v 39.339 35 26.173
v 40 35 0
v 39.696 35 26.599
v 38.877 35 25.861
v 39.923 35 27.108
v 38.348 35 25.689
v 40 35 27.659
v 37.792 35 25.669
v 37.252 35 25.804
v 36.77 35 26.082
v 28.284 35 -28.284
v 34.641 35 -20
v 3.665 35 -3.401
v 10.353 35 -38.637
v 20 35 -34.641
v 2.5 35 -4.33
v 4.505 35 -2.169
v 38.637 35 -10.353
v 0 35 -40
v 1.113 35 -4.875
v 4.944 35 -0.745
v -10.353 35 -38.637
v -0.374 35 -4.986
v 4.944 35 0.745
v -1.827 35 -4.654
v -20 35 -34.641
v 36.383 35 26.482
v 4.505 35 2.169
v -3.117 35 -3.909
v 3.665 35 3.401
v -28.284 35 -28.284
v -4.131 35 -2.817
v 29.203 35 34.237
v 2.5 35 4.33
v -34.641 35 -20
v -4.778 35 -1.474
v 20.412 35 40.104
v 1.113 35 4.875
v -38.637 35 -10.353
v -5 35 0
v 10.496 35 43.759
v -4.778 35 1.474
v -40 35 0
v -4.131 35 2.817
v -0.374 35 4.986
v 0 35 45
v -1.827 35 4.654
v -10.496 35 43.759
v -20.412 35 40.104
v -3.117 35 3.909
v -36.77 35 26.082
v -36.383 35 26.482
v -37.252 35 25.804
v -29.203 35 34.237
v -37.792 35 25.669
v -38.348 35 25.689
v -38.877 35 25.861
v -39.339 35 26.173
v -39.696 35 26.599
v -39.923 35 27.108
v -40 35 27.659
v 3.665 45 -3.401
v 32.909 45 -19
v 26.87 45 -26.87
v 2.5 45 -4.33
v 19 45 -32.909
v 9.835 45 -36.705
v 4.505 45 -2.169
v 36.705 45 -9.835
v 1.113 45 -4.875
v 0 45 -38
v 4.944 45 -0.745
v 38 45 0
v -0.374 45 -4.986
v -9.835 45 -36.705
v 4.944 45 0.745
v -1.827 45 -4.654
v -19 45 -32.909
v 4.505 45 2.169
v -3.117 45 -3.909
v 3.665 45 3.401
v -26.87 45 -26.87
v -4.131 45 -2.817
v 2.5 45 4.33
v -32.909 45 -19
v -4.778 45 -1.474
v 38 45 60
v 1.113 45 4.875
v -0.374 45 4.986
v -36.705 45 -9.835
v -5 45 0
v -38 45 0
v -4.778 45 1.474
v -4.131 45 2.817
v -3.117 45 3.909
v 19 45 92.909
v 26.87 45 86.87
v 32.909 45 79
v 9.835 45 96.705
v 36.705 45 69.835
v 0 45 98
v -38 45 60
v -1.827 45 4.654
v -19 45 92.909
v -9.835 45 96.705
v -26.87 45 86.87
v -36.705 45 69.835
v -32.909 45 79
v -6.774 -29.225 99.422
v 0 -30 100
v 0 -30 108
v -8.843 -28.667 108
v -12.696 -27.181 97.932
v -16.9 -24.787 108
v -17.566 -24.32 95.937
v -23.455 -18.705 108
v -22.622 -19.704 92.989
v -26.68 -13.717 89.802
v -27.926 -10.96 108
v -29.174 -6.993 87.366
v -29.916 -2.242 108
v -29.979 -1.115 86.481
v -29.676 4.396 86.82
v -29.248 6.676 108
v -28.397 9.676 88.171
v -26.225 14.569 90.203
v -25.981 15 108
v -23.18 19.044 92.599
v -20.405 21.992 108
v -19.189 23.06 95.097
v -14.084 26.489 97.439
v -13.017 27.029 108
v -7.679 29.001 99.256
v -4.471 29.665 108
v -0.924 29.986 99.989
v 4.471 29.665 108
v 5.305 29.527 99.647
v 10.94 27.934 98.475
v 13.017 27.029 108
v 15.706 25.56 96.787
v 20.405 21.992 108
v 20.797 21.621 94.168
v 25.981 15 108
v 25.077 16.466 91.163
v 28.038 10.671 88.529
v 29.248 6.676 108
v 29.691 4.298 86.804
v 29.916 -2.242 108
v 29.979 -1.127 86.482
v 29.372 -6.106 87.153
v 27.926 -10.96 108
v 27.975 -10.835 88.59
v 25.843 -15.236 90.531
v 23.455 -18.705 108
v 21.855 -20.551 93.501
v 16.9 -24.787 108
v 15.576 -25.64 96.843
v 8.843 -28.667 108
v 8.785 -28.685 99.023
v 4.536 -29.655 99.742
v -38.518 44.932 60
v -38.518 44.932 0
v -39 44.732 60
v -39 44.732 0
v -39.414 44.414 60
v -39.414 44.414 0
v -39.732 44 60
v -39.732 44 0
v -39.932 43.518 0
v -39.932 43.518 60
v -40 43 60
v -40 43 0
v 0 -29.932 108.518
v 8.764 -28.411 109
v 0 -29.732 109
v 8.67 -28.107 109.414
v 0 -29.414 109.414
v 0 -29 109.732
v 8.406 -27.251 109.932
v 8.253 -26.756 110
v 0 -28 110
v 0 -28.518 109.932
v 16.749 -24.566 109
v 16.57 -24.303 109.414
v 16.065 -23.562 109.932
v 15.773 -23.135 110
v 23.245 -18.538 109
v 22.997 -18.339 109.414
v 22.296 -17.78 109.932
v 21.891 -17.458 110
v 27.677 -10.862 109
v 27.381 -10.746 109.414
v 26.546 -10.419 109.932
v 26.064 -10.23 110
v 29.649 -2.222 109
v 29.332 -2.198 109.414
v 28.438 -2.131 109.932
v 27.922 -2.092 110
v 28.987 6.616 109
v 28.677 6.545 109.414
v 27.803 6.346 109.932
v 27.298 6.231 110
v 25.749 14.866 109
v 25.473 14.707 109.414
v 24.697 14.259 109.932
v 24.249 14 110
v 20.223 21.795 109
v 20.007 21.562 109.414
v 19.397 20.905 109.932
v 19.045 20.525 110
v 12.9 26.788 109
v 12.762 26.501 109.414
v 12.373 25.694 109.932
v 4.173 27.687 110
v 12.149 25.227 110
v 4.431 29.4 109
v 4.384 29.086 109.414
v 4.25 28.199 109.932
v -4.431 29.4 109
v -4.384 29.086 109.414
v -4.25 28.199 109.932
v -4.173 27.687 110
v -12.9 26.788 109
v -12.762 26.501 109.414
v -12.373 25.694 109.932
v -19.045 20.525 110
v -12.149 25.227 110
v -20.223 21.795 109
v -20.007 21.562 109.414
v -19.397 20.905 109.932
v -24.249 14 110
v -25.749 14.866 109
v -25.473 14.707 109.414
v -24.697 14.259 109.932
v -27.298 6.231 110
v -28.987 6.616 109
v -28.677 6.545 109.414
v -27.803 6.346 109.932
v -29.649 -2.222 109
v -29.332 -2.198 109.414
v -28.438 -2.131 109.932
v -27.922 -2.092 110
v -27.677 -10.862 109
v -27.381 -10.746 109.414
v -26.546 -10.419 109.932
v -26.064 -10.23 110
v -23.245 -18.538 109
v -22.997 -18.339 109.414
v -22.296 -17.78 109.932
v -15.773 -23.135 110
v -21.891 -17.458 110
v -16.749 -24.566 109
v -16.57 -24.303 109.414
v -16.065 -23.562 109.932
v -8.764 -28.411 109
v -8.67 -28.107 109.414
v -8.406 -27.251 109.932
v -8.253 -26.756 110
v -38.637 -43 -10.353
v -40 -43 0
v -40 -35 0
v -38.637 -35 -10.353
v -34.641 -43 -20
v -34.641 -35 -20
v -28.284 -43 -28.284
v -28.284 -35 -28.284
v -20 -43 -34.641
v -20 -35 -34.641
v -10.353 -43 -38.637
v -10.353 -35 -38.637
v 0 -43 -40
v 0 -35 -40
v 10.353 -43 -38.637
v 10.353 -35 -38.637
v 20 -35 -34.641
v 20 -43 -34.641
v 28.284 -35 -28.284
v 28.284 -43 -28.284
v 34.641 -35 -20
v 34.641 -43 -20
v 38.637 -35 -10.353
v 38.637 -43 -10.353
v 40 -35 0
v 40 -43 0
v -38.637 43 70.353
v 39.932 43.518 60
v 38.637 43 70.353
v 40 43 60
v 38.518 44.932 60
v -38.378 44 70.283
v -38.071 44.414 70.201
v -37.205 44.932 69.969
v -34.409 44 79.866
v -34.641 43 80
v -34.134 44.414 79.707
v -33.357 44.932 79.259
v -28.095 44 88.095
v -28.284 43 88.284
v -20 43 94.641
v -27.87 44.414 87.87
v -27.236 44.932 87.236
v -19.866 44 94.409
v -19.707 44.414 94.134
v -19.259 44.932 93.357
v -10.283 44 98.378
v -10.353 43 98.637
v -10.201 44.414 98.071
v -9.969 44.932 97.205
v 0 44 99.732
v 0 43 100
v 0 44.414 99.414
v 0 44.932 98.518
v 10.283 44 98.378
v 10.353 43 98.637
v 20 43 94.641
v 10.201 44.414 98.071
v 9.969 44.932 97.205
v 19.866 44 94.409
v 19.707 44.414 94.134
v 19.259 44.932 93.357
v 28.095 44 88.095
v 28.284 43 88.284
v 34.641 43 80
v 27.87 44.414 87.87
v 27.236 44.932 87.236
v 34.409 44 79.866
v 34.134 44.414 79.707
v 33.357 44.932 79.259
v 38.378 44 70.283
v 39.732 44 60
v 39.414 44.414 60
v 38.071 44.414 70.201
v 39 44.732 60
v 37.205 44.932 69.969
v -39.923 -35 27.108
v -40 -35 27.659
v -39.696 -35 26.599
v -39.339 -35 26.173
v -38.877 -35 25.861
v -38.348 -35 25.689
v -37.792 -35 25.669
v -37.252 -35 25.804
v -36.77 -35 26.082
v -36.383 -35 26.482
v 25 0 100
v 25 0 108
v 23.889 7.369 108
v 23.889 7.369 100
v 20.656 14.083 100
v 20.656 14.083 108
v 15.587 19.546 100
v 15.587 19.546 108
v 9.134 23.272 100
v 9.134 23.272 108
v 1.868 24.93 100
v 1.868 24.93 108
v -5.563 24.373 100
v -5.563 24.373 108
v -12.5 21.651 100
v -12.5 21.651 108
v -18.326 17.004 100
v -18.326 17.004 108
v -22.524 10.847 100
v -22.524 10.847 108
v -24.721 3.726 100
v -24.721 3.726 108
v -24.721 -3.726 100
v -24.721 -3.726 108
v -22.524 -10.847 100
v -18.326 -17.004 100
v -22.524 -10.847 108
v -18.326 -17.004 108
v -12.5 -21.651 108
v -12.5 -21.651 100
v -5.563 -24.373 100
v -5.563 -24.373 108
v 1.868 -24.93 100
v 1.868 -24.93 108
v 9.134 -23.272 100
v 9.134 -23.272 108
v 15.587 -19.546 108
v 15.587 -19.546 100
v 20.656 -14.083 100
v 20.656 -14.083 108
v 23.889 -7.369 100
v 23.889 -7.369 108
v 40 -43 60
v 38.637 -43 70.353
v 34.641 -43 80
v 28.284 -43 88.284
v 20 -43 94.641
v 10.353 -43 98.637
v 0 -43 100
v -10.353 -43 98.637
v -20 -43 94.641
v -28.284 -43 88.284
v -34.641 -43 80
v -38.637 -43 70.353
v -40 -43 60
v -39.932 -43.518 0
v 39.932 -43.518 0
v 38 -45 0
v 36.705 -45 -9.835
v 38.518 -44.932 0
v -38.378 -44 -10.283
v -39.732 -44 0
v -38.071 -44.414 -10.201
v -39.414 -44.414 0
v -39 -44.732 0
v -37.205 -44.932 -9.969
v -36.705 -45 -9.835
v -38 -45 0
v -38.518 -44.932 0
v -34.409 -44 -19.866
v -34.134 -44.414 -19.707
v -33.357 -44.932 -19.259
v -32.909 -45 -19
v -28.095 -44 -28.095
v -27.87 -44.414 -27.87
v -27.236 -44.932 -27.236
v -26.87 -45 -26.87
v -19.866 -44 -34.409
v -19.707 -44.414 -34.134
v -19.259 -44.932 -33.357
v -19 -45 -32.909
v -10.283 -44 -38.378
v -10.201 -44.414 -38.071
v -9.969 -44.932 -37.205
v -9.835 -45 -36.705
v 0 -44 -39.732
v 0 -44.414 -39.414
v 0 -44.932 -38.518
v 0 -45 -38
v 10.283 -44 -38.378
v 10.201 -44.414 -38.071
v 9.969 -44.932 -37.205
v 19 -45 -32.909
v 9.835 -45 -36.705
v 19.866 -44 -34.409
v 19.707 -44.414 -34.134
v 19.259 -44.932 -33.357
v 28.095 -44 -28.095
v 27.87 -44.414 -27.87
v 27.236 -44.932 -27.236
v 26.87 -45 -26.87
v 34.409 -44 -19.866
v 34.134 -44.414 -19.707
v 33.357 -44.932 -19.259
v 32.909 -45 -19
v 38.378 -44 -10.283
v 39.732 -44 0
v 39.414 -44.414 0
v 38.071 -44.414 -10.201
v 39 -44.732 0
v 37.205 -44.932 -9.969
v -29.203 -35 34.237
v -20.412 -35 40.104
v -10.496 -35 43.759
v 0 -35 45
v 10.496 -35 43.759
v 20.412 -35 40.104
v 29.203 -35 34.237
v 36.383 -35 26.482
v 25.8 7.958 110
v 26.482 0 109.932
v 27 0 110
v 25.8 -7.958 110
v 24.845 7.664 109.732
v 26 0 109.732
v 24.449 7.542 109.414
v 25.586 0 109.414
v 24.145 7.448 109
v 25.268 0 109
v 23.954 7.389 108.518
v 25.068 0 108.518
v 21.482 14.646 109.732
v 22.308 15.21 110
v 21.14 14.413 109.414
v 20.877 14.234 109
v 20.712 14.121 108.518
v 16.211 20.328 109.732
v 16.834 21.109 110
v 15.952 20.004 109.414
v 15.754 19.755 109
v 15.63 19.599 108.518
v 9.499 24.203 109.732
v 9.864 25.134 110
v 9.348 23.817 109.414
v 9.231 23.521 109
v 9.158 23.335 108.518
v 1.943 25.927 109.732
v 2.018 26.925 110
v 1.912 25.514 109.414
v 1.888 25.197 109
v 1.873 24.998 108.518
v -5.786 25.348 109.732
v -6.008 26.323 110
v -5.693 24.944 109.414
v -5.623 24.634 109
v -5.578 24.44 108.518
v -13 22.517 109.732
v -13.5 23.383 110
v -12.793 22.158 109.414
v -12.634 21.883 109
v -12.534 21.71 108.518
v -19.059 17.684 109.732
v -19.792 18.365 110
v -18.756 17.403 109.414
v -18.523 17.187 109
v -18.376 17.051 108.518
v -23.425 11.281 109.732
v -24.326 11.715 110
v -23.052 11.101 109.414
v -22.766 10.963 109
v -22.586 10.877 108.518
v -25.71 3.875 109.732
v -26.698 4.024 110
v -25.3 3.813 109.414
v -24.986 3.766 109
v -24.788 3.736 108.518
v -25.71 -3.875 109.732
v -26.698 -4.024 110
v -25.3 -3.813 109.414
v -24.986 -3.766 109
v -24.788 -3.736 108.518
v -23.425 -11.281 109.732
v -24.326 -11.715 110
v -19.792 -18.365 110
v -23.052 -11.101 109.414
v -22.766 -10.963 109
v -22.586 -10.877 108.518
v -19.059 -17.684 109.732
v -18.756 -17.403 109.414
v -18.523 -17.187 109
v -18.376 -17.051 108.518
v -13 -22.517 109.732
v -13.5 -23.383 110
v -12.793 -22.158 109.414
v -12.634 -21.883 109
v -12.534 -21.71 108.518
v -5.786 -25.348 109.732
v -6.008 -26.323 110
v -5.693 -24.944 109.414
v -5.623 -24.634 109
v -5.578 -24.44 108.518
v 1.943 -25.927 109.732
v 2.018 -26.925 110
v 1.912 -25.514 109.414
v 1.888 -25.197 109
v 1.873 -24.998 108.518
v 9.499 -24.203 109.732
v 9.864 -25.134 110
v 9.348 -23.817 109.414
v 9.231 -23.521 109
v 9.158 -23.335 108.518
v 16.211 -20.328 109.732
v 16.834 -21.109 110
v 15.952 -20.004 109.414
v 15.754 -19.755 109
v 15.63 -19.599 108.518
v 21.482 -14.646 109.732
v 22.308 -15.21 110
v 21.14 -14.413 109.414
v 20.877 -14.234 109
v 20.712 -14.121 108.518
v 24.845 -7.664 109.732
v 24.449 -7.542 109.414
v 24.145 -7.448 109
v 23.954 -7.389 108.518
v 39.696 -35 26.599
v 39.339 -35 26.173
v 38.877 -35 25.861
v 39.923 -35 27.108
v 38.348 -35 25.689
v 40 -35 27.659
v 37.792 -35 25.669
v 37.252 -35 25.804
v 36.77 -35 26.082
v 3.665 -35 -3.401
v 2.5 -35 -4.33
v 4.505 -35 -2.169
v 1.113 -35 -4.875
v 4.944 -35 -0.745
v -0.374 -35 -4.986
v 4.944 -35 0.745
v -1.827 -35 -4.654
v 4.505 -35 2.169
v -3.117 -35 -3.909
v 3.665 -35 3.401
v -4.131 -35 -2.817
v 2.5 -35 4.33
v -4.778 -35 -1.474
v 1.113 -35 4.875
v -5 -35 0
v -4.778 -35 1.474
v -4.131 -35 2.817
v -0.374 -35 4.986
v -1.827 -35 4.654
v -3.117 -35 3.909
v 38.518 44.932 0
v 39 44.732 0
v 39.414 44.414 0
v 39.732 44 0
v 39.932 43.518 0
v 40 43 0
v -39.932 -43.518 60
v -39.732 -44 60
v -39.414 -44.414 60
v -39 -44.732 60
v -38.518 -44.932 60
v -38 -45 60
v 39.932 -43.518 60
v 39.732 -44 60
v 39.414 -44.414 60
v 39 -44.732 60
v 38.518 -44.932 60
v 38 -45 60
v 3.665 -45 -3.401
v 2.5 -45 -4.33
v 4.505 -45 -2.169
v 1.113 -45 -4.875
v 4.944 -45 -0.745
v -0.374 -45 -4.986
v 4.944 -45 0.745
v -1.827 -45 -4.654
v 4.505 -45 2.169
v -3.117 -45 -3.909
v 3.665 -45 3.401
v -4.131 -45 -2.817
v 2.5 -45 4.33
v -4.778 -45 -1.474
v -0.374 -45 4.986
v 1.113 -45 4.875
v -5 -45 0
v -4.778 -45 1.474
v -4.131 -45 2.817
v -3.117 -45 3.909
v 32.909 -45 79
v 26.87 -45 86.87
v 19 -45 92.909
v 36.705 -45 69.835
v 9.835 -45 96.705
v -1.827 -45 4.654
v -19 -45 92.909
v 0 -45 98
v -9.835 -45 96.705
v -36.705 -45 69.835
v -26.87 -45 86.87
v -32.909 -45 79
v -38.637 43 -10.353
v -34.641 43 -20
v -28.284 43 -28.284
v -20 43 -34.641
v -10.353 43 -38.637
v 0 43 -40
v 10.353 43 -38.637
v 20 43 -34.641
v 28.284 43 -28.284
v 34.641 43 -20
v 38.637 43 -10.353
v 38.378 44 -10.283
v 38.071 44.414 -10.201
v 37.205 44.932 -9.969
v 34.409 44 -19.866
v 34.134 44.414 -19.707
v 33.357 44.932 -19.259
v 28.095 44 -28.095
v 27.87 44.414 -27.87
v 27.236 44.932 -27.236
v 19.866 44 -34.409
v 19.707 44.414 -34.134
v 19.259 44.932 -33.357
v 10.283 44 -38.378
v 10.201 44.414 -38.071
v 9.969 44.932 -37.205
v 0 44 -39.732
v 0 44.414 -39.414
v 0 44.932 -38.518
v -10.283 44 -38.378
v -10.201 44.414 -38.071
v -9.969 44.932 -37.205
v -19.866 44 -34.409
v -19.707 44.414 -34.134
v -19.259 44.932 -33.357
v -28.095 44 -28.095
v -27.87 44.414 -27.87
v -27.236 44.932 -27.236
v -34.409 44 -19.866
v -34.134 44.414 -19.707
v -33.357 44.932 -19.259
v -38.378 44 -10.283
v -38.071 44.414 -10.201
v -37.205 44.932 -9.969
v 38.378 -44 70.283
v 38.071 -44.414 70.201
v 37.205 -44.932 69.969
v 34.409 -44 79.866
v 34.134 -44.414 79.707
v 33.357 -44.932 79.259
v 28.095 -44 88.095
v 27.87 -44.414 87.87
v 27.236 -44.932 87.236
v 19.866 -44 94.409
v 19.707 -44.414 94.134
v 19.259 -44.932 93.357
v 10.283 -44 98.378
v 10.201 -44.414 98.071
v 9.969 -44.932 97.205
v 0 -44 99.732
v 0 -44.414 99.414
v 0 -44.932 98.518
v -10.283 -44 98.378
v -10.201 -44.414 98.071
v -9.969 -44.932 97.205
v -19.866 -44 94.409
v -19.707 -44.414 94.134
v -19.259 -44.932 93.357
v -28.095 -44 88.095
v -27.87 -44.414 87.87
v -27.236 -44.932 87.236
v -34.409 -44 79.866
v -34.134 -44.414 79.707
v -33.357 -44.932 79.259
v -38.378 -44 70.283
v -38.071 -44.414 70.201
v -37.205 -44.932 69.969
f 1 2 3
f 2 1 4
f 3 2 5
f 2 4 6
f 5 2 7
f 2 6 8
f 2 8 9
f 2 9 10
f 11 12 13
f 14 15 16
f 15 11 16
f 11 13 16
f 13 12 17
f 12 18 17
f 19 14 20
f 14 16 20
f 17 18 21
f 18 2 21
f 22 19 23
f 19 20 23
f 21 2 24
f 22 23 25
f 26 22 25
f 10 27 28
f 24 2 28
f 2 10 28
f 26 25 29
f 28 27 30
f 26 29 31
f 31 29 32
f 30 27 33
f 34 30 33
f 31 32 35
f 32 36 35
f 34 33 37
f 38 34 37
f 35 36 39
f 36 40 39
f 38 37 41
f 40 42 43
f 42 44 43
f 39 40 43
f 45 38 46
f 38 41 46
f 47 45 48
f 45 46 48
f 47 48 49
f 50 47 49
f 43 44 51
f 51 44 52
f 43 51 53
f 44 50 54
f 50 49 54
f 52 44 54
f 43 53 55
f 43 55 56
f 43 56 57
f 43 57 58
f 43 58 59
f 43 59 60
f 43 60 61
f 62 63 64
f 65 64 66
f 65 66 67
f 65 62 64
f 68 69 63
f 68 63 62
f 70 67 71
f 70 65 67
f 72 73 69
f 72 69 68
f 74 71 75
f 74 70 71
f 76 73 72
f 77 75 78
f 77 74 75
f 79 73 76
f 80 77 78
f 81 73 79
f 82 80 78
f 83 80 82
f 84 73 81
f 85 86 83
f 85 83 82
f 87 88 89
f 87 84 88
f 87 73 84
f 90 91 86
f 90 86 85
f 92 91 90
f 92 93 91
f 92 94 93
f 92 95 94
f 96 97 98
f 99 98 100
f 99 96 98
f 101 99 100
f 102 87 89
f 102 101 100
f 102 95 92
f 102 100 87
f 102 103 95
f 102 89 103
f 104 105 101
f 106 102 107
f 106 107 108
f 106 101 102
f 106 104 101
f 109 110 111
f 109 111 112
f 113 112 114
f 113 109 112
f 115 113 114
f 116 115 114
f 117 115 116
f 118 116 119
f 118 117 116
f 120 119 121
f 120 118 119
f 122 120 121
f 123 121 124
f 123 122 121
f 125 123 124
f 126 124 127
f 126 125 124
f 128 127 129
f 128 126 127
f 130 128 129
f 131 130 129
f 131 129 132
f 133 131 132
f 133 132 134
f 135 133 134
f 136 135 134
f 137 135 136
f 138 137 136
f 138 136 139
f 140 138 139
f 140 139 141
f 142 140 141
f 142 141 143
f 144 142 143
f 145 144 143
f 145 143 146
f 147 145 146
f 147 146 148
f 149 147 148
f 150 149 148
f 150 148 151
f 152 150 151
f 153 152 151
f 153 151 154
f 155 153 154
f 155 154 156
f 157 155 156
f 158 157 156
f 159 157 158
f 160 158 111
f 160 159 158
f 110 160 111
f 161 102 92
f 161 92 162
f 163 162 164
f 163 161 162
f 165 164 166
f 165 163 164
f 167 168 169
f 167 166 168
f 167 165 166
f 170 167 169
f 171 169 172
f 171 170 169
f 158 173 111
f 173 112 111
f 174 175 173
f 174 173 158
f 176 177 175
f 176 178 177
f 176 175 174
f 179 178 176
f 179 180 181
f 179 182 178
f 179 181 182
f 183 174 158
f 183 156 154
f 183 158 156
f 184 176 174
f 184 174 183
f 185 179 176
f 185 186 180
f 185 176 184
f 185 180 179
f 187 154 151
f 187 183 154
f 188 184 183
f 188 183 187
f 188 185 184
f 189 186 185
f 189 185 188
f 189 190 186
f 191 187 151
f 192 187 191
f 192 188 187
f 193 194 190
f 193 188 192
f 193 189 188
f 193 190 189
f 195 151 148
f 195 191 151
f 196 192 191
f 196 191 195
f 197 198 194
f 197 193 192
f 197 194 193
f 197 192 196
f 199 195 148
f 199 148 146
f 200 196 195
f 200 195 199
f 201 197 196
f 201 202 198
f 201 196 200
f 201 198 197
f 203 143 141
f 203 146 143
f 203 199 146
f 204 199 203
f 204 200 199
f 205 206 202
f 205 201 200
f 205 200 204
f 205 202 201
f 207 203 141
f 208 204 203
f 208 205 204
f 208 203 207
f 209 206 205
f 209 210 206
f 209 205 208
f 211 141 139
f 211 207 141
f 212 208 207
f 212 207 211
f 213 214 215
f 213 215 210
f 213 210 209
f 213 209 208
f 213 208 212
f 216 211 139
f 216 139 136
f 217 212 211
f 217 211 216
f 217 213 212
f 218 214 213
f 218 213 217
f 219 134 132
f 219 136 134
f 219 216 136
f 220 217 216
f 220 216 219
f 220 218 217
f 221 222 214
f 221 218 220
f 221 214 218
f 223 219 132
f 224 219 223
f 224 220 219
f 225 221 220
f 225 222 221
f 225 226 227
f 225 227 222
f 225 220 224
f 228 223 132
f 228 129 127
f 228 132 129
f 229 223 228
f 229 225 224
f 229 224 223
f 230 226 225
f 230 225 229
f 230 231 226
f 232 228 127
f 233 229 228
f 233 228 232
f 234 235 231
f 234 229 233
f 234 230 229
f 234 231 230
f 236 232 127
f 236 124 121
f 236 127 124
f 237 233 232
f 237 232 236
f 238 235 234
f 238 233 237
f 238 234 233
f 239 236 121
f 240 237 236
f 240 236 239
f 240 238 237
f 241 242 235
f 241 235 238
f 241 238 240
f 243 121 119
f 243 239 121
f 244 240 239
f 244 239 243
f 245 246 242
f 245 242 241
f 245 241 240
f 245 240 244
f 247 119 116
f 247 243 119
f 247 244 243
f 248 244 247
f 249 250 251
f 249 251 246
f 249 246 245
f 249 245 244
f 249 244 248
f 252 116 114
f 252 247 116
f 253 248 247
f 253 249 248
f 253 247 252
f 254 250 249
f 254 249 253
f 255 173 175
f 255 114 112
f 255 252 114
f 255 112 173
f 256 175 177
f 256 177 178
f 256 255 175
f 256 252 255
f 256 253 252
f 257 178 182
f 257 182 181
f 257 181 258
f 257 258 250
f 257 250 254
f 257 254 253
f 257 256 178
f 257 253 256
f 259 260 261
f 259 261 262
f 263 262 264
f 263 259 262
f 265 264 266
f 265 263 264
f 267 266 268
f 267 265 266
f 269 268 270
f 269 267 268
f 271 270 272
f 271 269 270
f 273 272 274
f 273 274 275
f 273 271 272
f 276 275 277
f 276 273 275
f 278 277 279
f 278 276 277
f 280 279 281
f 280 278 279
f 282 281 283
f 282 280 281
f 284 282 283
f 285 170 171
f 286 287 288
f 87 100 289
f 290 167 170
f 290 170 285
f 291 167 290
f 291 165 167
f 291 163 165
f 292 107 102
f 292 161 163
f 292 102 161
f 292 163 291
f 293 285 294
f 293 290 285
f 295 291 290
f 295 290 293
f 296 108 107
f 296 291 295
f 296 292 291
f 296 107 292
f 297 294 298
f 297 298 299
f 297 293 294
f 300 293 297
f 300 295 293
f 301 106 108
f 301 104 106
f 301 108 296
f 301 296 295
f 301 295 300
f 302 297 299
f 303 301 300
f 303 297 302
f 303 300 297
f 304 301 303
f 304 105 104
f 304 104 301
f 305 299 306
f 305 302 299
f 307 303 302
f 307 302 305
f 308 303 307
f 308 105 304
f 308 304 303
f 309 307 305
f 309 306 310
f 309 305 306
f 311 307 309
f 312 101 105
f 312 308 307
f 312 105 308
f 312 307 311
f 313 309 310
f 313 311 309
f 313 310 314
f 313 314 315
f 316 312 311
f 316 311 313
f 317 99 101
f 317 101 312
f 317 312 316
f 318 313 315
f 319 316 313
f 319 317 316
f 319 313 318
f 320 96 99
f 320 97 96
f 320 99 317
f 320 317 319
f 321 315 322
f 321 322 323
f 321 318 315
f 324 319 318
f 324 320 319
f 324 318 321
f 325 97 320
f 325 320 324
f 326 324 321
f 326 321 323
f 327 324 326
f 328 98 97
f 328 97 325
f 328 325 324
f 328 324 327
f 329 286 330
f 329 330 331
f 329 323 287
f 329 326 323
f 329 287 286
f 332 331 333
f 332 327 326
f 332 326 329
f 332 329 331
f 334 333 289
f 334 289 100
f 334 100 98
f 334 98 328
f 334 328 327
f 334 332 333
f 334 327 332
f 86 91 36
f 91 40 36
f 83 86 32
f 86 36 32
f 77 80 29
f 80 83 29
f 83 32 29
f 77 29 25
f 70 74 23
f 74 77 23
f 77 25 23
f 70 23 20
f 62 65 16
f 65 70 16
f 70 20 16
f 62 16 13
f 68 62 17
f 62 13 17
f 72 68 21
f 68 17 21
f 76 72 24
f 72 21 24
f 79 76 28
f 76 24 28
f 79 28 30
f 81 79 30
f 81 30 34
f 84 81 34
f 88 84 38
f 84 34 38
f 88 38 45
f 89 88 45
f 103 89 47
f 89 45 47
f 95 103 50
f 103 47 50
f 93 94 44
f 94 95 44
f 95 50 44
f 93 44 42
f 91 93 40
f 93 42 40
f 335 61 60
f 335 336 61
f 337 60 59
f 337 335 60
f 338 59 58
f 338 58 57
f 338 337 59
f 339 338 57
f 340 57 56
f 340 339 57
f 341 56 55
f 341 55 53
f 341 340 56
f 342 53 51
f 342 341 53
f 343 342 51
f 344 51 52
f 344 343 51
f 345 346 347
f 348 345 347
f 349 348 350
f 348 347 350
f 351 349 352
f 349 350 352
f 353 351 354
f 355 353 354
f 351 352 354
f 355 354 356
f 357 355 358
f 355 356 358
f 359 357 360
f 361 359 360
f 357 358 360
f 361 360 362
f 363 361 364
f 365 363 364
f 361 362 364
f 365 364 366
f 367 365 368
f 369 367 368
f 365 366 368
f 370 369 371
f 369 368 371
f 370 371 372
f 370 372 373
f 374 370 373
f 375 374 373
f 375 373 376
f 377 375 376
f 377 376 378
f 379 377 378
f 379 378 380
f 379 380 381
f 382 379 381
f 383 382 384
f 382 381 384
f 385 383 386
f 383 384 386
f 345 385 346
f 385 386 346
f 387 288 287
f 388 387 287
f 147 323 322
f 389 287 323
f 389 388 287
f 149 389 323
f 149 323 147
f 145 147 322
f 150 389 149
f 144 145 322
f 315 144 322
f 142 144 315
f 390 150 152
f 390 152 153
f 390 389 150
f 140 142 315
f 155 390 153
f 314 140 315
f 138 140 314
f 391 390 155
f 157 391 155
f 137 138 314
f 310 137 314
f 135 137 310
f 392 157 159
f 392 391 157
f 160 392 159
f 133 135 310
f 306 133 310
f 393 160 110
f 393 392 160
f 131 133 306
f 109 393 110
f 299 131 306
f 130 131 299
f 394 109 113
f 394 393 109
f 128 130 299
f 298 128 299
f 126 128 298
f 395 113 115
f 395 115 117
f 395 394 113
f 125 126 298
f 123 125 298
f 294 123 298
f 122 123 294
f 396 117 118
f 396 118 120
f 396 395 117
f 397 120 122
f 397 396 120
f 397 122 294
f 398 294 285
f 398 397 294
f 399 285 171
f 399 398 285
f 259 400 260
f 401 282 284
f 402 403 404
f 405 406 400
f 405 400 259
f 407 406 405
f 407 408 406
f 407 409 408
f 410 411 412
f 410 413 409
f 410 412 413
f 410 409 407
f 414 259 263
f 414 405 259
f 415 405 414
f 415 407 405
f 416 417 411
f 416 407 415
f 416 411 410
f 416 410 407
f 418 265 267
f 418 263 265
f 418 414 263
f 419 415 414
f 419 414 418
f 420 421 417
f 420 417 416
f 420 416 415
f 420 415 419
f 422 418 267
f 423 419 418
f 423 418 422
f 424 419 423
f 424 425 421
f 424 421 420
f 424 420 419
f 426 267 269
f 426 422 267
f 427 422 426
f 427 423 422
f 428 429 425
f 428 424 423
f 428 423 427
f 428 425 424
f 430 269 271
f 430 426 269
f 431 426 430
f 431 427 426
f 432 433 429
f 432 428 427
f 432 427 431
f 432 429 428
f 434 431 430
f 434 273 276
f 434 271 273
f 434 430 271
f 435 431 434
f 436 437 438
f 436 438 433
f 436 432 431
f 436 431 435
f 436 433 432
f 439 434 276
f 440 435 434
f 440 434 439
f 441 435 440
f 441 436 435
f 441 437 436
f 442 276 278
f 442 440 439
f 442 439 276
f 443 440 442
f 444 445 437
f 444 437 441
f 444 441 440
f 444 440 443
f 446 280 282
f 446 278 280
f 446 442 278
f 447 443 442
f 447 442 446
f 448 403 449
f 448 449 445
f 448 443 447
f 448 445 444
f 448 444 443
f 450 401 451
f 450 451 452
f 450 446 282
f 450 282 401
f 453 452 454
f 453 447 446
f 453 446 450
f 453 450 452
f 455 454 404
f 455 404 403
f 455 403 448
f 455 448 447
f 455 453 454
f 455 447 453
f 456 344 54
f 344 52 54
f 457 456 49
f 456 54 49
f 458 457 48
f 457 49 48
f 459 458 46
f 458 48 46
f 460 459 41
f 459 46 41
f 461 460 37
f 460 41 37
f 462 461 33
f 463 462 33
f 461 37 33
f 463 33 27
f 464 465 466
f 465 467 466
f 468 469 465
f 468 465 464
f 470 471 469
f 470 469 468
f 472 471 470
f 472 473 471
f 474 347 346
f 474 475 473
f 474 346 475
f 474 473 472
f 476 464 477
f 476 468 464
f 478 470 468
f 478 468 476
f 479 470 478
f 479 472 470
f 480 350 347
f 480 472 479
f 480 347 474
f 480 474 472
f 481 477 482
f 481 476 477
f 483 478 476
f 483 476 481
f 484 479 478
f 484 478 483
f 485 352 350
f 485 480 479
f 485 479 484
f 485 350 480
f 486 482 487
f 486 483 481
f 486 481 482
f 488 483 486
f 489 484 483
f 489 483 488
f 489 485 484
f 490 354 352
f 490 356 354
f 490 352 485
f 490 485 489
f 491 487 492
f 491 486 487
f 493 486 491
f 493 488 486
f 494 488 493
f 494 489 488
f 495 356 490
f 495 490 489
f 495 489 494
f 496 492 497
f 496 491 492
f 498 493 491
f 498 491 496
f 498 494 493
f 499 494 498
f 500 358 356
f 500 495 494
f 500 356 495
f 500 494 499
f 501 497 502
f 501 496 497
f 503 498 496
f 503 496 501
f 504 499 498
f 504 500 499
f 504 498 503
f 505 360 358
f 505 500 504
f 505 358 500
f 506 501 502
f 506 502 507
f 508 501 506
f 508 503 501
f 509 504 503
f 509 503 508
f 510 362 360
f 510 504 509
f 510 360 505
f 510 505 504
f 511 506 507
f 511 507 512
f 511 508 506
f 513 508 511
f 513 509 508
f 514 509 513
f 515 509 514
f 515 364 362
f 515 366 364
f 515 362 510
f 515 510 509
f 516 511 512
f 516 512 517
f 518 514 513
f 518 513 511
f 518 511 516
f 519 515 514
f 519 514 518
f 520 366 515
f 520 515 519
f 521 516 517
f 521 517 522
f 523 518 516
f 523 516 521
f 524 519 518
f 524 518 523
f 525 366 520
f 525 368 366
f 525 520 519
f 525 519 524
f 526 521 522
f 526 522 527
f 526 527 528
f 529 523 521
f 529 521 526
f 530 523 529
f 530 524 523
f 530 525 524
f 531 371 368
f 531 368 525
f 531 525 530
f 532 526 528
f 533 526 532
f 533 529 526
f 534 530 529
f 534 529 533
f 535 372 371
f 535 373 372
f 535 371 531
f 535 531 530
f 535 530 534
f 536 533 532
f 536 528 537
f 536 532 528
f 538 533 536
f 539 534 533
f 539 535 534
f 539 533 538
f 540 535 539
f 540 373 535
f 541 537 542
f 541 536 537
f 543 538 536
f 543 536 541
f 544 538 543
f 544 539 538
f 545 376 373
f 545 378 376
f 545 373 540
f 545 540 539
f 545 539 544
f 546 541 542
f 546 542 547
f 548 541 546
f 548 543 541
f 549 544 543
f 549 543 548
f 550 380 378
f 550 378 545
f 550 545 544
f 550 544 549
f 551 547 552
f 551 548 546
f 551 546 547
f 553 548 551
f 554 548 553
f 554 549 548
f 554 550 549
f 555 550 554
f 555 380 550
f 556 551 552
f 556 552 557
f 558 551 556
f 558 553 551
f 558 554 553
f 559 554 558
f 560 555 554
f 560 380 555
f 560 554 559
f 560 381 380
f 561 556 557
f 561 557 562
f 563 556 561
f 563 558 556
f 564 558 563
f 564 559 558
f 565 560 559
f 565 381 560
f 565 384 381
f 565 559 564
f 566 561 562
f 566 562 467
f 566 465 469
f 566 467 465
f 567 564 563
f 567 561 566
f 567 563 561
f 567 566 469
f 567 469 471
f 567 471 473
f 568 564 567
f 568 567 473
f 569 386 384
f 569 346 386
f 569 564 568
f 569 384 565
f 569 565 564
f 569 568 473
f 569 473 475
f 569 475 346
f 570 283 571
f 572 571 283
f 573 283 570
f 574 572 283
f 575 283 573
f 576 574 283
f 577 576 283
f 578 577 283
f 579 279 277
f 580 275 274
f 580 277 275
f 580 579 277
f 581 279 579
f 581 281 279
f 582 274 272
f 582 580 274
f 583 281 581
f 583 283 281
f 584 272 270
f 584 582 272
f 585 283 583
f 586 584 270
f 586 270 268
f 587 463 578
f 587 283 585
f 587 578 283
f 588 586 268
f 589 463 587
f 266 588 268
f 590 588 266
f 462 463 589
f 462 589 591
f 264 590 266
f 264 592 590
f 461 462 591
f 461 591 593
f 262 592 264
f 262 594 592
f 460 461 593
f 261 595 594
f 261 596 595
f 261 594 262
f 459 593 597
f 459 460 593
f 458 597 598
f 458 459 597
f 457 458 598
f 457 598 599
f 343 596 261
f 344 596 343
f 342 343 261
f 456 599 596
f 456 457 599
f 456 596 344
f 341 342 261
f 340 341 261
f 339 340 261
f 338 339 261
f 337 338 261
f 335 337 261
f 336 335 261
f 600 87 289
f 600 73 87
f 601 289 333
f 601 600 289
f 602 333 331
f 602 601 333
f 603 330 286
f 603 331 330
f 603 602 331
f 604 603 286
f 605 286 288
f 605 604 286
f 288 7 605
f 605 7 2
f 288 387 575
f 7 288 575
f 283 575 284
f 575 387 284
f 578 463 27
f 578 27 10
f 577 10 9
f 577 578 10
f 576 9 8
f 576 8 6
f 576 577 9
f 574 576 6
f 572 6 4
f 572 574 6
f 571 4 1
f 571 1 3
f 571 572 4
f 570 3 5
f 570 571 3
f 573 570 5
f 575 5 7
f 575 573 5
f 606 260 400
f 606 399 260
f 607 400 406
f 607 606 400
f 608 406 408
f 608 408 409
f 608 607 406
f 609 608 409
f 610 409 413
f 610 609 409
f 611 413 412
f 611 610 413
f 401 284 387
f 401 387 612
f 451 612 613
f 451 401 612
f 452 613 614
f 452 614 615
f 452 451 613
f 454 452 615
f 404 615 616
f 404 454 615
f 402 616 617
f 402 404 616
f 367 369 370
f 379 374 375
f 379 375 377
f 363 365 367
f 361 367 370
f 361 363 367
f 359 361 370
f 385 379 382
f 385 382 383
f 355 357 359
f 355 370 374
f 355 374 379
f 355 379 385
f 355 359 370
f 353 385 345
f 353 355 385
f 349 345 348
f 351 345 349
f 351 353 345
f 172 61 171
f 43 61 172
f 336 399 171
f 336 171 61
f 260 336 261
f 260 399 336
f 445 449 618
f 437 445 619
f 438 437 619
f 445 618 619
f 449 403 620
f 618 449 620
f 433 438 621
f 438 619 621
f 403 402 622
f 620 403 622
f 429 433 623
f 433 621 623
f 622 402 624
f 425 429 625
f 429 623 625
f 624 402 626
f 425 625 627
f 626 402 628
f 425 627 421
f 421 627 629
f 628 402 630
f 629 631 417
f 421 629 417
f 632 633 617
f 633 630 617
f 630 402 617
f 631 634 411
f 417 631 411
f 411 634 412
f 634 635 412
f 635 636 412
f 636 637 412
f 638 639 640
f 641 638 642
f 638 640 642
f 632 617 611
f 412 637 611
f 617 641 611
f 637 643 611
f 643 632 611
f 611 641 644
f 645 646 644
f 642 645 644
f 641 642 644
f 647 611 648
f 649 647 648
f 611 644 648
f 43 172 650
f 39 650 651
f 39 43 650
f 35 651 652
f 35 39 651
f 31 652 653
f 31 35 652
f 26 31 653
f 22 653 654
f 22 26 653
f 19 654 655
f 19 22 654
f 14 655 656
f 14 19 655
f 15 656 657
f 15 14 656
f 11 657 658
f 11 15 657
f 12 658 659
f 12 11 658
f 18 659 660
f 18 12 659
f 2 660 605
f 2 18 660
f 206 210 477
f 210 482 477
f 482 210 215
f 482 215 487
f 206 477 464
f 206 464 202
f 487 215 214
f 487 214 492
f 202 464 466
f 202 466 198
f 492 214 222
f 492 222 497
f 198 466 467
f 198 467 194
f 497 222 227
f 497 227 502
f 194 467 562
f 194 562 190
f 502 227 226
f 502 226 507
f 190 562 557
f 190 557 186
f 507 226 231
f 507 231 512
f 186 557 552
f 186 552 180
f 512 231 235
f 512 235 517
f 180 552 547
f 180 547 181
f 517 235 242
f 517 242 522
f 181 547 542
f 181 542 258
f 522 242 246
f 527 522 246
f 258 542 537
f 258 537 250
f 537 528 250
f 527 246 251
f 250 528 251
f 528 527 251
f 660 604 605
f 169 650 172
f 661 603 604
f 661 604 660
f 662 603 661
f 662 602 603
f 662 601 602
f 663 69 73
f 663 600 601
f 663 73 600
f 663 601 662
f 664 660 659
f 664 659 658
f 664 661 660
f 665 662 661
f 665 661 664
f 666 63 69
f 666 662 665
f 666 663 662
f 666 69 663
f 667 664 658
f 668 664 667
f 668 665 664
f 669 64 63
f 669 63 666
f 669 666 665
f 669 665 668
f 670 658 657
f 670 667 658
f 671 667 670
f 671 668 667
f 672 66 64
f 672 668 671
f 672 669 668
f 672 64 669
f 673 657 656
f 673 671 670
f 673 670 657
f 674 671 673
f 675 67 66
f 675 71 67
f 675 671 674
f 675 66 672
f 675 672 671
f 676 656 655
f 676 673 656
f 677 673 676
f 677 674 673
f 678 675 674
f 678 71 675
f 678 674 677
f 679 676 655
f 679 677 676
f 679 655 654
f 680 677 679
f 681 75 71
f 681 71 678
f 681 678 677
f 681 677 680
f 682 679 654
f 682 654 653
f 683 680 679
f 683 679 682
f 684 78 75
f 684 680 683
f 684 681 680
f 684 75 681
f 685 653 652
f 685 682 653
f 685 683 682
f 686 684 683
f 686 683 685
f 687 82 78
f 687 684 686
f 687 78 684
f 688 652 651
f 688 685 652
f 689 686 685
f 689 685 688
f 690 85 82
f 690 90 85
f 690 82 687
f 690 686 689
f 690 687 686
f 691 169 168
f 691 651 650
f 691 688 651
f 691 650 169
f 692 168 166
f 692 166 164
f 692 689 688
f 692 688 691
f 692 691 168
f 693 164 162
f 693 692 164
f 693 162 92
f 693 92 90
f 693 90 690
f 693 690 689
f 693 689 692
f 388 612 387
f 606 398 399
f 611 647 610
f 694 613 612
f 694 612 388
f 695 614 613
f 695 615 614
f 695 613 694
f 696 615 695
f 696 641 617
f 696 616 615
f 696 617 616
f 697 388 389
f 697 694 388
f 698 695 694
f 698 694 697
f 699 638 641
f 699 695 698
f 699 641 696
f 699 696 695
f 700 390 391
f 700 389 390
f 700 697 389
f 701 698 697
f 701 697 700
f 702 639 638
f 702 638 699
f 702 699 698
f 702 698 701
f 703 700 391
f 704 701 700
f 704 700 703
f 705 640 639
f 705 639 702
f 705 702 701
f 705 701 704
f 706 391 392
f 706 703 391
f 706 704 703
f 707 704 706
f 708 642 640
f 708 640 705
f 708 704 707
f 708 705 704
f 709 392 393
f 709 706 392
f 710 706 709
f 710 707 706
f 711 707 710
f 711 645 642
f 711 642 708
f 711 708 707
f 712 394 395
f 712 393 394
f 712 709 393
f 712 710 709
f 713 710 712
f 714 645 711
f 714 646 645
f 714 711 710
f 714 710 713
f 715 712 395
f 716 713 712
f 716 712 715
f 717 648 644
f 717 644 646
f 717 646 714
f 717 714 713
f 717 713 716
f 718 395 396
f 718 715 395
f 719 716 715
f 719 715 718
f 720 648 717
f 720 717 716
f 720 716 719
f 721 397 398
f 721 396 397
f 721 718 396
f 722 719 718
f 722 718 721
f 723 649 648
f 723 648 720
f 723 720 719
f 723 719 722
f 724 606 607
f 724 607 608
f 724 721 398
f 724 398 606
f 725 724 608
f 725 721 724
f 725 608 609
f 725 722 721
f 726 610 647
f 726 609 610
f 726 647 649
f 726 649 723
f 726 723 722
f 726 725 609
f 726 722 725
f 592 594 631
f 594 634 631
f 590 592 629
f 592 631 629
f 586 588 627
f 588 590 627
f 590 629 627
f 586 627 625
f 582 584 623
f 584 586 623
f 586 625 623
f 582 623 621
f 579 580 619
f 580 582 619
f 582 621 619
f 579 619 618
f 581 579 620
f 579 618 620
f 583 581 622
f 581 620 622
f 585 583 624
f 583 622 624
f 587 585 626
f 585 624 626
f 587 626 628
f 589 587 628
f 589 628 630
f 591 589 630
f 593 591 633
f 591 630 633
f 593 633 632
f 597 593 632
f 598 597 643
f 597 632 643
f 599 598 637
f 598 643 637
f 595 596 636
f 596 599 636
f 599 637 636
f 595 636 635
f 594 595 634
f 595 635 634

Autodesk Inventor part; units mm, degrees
ref_plane "YZ Plane" through (0, 0, 0) normal (1, 0, 0) x (0, 1, 0)
ref_plane "XZ Plane" through (0, 0, 0) normal (0, 1, 0) x (-1, 0, 0)
sketch "Sketch1" plane through (0, 0, 0) normal (0, 1, 0) x (-1, 0, 0)
  arc A0 (26.4575, 30) -> (-26.4575, 30) centre (0, 0) ccw construction
  arc A1 (40, 60) -> (-40, 60) centre (0, 60) ccw
  line L0 (0, 100) -> (0, 0) construction
  line L1 (40, 60) -> (40, 0)
  line L2 (-40, 60) -> (-40, 0)
  arc A2 (26.4575, 30) -> (40, 60) centre (0, 60) ccw construction
  arc A3 (40, 0) -> (26.4575, 30) centre (0, 0) ccw construction
  arc A4 (-40, 60) -> (26.4575, 30) centre (0, 60) ccw construction
  arc A5 (-26.4575, 30) -> (-40, 0) centre (0, 0) ccw construction
  arc A6 (-40, 0) -> (40, 0) centre (0, 0) ccw
  circle A7 centre (0, 0) radius 5
  dimension "d0" = 80
  dimension "d1" = 80
  dimension "d2" = 100
  dimension "d3" = 10
extrude "Extrusion1" add sketch "Sketch1" along normal mid plane 90
sketch "Sketch2" plane through (0, 0, 0) normal (0, 1, 0) x (-1, 0, 0)
  circle A0 centre (0, 0) radius 5 projected
  circle A1 centre (0, 0) radius 45
  dimension "d6" = 90
extrude "Extrusion2" cut sketch "Sketch2" along normal mid plane 70
fillet "Fillet1" radius 2 10 edges at (40, 0, 20.6155) (-40, 0, 20.6155) (0, 45, -40) (-40, 45, 30) (0, 45, 100) (40, 45, 30) (0, -45, 100) (-40, -45, 30) (0, -45, -40) (40, -45, 30)
ref_plane "Work Plane1" through (40, 0, 60) normal (0, 0, -1) x (0, -1, 0)
sketch "Sketch3" plane through (40, 0, 60) normal (0, 0, -1) x (0, -1, 0)
  circle A0 centre (0, 40) radius 30
  line L0 (0, 40) -> (0, 40)
  dimension "d10" = 60
  dimension "d11" = 0
extrude "Extrusion3" add sketch "Sketch3" against normal blind 50
sketch "Sketch4" plane through (0, 0, 110) normal (0, 0, 1) x (1, 0, 0)
  circle A0 centre (0, 0) radius 30 projected
  circle A1 centre (0, 0) radius 25
  point P0 (0, 0)
  dimension "d14" = 50
extrude "Extrusion4" cut sketch "Sketch4" against normal blind 10 contours A1
fillet "Fillet2" radius 2 2 edges at (0, 30, 110) (-25, 0, 110)
properties part number "Wirst2_V0.4"
